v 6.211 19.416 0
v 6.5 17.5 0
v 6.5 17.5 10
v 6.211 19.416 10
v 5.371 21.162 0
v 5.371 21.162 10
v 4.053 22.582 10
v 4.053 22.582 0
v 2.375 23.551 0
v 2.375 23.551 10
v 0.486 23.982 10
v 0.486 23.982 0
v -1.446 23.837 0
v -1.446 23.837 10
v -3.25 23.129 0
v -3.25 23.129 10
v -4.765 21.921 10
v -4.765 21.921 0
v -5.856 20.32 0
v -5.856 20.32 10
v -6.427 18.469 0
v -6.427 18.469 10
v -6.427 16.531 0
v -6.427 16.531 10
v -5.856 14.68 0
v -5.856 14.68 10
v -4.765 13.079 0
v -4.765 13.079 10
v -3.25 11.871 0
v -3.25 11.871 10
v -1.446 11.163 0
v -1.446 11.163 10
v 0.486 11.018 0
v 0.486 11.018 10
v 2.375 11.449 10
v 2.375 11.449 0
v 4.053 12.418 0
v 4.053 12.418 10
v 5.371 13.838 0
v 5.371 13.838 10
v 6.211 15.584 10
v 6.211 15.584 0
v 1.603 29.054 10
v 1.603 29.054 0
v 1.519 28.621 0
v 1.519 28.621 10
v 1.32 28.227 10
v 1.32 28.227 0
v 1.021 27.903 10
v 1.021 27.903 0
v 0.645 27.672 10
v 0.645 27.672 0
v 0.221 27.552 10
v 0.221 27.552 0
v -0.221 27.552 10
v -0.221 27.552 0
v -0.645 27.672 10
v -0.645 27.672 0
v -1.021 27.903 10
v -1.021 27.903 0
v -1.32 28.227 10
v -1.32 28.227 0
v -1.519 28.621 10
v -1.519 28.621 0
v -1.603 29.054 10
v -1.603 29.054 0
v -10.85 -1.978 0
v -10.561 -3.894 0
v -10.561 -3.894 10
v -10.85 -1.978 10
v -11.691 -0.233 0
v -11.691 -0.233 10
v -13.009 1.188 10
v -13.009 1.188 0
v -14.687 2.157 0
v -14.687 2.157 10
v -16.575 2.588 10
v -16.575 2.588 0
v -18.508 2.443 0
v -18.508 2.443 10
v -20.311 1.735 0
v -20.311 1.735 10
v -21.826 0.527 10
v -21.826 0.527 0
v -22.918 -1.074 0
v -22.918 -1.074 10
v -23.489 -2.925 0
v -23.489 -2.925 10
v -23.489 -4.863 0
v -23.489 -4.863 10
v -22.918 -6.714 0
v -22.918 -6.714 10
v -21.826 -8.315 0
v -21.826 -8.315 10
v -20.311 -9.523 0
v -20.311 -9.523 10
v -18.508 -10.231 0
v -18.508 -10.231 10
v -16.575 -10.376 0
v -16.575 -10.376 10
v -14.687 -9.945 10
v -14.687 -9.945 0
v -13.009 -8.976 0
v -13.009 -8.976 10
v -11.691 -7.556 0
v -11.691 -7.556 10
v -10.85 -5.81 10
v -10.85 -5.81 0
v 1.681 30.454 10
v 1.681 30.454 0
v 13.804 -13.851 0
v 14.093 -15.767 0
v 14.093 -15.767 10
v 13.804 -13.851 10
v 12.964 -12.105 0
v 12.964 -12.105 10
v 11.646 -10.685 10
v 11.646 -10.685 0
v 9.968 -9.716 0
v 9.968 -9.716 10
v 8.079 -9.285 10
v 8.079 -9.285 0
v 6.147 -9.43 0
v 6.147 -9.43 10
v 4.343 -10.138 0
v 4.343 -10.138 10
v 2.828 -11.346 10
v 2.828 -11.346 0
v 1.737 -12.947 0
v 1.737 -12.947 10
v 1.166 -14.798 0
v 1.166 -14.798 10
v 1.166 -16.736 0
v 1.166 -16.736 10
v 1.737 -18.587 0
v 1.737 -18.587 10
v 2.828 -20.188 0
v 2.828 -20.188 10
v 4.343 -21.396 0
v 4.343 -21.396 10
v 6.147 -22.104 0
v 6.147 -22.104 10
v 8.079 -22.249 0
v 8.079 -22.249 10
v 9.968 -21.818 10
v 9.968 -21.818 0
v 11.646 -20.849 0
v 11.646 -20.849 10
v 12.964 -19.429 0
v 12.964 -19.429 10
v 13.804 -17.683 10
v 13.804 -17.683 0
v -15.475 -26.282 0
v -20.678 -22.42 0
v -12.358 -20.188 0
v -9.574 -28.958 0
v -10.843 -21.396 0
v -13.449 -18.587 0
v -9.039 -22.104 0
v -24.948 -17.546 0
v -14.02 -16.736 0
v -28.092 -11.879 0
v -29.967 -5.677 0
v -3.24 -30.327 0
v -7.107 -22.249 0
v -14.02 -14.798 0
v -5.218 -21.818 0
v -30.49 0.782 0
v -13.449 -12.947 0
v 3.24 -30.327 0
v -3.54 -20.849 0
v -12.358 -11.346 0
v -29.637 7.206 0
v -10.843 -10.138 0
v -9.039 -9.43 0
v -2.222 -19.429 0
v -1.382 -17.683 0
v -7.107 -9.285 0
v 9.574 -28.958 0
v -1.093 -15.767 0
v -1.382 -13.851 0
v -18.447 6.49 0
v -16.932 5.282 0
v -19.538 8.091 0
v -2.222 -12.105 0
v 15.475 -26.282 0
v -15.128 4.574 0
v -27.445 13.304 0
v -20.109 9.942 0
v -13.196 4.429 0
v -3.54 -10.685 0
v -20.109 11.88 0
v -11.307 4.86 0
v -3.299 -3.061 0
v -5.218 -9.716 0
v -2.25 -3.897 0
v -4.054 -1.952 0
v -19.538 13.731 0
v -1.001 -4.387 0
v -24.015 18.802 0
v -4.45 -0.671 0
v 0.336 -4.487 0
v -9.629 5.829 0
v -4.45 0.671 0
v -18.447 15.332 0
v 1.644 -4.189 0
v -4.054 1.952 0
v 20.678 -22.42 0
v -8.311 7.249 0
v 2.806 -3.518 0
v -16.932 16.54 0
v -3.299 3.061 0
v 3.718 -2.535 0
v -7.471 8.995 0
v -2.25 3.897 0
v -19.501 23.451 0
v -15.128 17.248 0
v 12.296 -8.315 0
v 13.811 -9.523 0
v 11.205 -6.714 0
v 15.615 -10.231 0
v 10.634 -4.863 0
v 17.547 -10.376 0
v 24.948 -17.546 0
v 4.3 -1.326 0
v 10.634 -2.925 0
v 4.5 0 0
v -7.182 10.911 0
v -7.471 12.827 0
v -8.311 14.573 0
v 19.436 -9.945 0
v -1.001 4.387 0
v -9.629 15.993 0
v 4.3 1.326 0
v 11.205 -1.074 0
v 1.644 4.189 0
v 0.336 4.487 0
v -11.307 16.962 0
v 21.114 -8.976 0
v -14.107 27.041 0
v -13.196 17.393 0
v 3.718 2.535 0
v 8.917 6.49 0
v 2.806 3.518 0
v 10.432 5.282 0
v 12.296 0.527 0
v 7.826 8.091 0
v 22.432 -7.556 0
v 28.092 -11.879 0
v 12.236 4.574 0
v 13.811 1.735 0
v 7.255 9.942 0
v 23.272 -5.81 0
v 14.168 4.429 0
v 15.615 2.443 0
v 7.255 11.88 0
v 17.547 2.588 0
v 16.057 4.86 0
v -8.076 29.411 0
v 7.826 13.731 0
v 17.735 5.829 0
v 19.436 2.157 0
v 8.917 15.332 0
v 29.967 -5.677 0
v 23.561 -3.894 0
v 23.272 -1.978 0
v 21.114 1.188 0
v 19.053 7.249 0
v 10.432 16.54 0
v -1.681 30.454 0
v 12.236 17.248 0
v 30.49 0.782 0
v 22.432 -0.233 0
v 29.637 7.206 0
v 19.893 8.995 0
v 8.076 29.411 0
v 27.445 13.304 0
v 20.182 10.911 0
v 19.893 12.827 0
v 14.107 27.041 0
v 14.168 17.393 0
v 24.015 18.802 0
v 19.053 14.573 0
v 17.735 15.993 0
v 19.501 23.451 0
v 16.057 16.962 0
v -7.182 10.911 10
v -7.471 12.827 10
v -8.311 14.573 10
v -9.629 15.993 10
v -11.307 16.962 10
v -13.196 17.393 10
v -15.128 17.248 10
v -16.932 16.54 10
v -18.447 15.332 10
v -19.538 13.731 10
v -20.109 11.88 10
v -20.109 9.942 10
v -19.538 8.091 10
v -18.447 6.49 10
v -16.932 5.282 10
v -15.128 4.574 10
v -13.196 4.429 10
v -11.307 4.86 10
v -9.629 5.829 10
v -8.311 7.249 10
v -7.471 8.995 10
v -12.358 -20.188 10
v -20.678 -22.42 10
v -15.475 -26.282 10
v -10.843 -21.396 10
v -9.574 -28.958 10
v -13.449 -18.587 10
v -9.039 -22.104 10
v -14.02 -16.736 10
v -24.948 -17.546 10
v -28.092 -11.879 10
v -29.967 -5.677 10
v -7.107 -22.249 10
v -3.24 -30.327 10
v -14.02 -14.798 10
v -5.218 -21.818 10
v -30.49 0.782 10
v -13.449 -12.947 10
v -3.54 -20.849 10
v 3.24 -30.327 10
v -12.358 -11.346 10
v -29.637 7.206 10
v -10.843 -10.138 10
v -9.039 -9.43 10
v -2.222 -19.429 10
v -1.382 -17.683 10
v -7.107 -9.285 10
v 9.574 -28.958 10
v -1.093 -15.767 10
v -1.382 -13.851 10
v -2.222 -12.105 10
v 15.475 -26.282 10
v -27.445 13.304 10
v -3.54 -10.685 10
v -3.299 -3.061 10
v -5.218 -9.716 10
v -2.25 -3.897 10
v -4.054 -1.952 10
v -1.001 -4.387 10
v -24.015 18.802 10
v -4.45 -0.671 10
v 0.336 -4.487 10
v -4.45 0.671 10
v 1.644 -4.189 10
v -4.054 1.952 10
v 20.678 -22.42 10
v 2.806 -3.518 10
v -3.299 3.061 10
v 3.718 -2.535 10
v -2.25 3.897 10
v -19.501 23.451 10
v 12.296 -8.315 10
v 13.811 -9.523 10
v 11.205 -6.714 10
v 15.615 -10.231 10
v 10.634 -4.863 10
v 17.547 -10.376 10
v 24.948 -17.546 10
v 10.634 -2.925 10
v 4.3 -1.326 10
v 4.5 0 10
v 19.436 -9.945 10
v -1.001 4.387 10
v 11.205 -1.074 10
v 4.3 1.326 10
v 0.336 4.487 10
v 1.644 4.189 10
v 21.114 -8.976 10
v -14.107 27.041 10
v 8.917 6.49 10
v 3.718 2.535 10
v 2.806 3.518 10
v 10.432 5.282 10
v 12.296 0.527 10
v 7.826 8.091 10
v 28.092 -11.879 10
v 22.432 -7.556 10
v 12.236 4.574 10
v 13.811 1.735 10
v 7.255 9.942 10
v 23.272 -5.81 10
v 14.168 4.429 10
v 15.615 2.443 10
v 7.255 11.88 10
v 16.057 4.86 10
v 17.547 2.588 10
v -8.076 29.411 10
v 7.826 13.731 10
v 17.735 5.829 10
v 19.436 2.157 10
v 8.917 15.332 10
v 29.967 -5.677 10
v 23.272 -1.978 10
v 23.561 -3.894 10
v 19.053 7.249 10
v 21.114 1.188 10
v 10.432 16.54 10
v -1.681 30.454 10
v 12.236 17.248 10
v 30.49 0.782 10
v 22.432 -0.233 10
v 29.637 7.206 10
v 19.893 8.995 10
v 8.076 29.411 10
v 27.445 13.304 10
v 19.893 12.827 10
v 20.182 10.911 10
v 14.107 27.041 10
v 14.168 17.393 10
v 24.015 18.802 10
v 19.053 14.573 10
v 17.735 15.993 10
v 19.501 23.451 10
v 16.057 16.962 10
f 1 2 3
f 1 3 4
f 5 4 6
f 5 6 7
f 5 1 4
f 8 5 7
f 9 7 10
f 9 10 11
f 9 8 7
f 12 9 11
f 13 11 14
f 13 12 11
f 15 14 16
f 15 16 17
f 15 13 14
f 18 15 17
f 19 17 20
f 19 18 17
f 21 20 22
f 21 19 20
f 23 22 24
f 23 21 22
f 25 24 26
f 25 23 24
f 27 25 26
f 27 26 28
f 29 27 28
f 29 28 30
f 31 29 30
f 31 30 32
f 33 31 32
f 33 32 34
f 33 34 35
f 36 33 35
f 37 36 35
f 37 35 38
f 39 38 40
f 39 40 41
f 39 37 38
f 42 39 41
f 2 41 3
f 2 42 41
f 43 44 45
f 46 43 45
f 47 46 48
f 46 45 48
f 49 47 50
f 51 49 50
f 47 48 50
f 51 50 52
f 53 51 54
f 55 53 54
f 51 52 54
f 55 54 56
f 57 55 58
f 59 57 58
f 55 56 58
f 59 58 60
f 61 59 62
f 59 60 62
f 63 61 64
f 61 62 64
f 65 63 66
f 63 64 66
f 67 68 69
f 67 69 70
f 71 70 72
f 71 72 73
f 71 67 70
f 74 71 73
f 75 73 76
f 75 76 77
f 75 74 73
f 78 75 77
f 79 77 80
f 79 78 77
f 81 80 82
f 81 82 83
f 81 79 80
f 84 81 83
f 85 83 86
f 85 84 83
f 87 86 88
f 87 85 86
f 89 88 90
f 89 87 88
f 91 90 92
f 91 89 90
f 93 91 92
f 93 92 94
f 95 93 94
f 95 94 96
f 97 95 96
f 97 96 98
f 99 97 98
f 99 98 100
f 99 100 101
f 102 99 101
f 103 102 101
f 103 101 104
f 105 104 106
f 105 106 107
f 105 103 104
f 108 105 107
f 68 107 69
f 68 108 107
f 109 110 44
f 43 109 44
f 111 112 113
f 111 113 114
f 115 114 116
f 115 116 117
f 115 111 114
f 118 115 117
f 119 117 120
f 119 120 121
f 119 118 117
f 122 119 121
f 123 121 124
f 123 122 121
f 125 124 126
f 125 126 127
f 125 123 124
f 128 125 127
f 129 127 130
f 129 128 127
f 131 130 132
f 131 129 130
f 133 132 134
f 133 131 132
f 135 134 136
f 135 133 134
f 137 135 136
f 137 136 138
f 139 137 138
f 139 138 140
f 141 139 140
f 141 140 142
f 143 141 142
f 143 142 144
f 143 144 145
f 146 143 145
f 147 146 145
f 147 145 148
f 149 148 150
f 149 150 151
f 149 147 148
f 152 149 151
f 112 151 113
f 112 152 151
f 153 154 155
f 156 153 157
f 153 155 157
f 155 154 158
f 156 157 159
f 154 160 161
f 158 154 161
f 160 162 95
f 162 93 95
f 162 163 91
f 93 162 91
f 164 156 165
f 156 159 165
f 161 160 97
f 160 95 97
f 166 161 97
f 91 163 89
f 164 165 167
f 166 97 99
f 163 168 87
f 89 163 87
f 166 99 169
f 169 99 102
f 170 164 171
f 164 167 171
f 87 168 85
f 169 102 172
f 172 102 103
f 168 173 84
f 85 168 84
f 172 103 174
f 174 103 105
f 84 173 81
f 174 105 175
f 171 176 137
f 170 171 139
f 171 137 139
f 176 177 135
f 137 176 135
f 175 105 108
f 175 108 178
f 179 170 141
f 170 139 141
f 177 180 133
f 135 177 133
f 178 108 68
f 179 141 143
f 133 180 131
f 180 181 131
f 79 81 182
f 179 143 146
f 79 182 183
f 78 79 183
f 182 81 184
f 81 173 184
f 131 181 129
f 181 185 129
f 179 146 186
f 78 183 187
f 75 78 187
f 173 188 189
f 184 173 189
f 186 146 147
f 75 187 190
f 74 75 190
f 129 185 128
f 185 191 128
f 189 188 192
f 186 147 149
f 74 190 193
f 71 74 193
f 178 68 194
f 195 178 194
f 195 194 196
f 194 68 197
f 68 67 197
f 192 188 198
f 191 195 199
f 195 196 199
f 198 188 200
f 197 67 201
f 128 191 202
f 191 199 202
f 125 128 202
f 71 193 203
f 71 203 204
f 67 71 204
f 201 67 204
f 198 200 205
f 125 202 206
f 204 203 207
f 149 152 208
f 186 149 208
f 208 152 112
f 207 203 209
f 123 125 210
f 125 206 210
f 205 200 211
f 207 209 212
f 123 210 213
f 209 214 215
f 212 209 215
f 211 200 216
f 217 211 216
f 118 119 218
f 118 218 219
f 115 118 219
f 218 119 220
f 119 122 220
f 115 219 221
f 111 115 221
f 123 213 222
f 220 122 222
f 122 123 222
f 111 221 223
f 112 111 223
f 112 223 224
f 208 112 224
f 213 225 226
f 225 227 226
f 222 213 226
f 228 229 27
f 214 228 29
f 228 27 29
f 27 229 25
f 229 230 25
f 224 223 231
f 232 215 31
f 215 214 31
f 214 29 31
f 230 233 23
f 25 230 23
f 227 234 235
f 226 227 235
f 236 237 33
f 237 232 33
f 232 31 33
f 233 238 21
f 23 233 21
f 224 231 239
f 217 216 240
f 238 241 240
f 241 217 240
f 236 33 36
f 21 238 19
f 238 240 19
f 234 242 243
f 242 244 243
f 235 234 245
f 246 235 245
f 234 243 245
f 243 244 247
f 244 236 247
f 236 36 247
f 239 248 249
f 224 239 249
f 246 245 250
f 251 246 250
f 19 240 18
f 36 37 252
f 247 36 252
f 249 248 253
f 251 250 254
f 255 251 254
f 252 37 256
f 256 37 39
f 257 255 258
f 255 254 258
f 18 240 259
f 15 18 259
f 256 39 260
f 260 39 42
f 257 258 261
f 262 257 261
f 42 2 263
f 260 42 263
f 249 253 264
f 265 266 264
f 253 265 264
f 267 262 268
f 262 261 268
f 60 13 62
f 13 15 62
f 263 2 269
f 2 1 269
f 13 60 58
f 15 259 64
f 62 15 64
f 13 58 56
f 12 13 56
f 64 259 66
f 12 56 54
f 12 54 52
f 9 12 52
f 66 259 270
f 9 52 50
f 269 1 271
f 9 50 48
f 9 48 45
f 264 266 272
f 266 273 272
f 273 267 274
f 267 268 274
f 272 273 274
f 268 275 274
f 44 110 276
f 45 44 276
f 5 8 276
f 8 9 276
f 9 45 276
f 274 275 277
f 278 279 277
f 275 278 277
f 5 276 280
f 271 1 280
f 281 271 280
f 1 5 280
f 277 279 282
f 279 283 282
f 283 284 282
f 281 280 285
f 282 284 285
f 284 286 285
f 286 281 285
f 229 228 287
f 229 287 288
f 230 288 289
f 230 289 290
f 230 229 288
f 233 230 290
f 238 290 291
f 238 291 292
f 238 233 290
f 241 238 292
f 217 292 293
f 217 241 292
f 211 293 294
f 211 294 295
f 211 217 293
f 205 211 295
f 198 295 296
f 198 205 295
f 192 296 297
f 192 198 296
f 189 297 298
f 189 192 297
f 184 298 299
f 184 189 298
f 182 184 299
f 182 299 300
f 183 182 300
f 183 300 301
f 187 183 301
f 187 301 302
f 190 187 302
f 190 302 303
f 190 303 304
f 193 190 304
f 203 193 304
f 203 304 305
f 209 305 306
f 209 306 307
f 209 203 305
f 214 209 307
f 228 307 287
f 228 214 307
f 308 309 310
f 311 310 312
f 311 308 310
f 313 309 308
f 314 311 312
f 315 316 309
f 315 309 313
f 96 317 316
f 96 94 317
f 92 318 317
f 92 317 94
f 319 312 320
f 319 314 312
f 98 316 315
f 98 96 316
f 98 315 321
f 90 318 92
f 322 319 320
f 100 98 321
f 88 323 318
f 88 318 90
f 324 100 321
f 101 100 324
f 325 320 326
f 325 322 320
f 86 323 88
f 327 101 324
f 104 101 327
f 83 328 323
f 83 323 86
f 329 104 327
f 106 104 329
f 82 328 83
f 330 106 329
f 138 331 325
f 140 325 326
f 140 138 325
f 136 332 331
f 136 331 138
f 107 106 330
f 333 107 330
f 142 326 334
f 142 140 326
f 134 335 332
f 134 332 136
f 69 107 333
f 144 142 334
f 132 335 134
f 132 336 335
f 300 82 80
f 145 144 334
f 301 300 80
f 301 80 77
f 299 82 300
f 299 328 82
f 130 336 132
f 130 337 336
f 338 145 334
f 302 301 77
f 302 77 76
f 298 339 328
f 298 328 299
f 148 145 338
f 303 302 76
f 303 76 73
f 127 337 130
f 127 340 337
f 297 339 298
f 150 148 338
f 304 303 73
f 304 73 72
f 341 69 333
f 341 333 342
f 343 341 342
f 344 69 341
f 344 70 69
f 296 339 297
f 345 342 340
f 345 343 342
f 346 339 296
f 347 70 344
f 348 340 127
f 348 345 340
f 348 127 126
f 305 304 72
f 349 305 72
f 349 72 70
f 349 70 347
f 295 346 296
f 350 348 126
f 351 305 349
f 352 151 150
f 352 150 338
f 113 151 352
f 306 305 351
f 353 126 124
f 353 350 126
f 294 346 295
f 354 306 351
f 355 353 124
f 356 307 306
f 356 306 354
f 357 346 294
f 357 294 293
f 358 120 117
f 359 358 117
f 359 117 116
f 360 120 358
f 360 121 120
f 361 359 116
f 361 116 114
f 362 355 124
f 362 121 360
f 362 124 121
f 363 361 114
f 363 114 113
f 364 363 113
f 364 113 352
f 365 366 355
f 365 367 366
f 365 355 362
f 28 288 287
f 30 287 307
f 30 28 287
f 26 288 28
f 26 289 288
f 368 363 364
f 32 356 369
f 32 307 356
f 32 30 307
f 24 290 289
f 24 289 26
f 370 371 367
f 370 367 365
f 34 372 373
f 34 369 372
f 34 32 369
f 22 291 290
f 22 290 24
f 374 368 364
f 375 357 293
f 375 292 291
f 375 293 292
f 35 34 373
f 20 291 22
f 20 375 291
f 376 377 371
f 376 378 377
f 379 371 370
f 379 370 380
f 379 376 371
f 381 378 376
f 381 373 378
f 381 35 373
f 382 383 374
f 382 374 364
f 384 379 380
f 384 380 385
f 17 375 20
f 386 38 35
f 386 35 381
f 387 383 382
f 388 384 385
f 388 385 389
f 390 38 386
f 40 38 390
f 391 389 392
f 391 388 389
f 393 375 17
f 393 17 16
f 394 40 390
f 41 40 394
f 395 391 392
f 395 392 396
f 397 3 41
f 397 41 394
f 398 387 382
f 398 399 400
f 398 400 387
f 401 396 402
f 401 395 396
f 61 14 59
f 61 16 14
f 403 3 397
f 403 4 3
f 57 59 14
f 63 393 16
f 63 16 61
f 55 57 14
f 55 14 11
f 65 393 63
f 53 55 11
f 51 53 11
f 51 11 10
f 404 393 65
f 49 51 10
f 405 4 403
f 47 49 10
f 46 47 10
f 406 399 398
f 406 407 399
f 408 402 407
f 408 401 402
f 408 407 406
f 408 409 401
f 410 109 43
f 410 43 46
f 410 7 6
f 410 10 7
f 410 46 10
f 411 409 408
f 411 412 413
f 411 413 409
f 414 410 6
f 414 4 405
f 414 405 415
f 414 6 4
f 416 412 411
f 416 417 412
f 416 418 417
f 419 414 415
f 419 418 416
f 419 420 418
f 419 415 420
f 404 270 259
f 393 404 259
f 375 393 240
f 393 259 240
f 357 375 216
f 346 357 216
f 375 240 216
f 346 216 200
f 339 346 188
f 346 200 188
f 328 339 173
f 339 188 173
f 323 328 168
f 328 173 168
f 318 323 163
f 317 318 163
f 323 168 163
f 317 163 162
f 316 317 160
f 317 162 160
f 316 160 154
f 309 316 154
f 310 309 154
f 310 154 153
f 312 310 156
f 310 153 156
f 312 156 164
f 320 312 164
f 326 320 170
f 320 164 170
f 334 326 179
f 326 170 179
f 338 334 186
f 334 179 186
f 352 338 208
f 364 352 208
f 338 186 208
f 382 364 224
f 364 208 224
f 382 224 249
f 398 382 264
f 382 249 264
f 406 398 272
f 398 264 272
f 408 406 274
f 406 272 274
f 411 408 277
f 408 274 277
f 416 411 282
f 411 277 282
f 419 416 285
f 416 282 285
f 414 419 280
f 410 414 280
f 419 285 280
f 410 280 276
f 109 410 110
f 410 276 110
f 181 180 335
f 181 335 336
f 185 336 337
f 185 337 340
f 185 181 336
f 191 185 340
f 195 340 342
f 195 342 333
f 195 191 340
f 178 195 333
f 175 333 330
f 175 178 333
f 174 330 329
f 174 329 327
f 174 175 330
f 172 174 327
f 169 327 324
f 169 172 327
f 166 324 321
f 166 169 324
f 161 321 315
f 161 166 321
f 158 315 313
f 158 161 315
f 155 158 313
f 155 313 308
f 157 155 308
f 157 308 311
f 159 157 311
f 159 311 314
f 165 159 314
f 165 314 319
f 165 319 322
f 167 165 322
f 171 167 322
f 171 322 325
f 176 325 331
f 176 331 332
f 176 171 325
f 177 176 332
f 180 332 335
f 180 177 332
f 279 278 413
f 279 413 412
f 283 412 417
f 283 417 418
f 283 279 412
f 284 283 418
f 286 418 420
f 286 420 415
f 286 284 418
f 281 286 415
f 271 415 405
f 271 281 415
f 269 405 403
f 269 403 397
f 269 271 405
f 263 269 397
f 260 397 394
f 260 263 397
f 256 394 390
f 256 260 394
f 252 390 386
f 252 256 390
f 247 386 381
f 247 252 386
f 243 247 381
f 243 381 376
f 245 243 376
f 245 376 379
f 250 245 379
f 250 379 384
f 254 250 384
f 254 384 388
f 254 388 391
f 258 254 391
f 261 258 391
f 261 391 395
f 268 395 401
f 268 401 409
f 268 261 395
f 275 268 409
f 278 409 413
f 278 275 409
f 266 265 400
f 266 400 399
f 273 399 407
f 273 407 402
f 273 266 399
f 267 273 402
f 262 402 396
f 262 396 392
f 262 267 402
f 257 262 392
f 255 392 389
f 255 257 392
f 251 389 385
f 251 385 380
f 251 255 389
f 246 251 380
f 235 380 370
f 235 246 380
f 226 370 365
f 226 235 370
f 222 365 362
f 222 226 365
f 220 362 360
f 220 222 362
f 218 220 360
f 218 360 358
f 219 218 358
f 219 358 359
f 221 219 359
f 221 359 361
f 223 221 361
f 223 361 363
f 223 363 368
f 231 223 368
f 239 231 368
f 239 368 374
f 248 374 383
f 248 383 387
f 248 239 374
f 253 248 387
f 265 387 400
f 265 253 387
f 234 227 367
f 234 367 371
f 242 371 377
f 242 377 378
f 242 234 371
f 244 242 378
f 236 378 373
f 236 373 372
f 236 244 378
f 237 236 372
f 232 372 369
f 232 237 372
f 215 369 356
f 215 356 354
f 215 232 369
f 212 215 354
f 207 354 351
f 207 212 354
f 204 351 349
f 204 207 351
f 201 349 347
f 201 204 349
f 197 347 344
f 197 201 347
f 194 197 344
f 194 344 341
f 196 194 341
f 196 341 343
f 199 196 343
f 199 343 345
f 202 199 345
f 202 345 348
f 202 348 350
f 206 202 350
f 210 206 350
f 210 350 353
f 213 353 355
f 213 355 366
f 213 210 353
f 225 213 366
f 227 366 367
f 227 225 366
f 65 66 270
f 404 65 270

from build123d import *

# Parameters (mm, degrees)
SZKIC1_R                    = 4.5
SZKIC1_R_2                  = 6.5
DODANIE_WYCI_GNI_CIE1_DEPTH = 10


with BuildPart() as part:
    # Szkic1 → Dodanie-wyciągnięcie1 (new body)
    with BuildSketch(Plane.XY):
        with BuildLine():
            Line((1.680612664, 30.453662195), (1.603352408, 29.053662195))
            ThreePointArc((1.603352408, 29.053662195), (0, 27.536352592), (-1.603352408, 29.053662195))
            Line((-1.603352408, 29.053662195), (-1.680612664, 30.453662195))
            ThreePointArc((-1.680612664, 30.453662195), (0, -30.5), (1.680612664, 30.453662195))
        make_face()
        Circle(SZKIC1_R, mode=Mode.SUBTRACT)
        with Locations((0, 17.5)):
            Circle(SZKIC1_R_2, mode=Mode.SUBTRACT)
        with Locations((13.682050943, 10.911071533)):
            Circle(SZKIC1_R_2, mode=Mode.SUBTRACT)
        with Locations((17.061238463, -3.894116344)):
            Circle(SZKIC1_R_2, mode=Mode.SUBTRACT)
        with Locations((7.592965435, -15.766955188)):
            Circle(SZKIC1_R_2, mode=Mode.SUBTRACT)
        with Locations((-7.592965435, -15.766955188)):
            Circle(SZKIC1_R_2, mode=Mode.SUBTRACT)
        with Locations((-17.061238463, -3.894116344)):
            Circle(SZKIC1_R_2, mode=Mode.SUBTRACT)
        with Locations((-13.682050943, 10.911071533)):
            Circle(SZKIC1_R_2, mode=Mode.SUBTRACT)
    extrude(amount=DODANIE_WYCI_GNI_CIE1_DEPTH)


solid = part.part
